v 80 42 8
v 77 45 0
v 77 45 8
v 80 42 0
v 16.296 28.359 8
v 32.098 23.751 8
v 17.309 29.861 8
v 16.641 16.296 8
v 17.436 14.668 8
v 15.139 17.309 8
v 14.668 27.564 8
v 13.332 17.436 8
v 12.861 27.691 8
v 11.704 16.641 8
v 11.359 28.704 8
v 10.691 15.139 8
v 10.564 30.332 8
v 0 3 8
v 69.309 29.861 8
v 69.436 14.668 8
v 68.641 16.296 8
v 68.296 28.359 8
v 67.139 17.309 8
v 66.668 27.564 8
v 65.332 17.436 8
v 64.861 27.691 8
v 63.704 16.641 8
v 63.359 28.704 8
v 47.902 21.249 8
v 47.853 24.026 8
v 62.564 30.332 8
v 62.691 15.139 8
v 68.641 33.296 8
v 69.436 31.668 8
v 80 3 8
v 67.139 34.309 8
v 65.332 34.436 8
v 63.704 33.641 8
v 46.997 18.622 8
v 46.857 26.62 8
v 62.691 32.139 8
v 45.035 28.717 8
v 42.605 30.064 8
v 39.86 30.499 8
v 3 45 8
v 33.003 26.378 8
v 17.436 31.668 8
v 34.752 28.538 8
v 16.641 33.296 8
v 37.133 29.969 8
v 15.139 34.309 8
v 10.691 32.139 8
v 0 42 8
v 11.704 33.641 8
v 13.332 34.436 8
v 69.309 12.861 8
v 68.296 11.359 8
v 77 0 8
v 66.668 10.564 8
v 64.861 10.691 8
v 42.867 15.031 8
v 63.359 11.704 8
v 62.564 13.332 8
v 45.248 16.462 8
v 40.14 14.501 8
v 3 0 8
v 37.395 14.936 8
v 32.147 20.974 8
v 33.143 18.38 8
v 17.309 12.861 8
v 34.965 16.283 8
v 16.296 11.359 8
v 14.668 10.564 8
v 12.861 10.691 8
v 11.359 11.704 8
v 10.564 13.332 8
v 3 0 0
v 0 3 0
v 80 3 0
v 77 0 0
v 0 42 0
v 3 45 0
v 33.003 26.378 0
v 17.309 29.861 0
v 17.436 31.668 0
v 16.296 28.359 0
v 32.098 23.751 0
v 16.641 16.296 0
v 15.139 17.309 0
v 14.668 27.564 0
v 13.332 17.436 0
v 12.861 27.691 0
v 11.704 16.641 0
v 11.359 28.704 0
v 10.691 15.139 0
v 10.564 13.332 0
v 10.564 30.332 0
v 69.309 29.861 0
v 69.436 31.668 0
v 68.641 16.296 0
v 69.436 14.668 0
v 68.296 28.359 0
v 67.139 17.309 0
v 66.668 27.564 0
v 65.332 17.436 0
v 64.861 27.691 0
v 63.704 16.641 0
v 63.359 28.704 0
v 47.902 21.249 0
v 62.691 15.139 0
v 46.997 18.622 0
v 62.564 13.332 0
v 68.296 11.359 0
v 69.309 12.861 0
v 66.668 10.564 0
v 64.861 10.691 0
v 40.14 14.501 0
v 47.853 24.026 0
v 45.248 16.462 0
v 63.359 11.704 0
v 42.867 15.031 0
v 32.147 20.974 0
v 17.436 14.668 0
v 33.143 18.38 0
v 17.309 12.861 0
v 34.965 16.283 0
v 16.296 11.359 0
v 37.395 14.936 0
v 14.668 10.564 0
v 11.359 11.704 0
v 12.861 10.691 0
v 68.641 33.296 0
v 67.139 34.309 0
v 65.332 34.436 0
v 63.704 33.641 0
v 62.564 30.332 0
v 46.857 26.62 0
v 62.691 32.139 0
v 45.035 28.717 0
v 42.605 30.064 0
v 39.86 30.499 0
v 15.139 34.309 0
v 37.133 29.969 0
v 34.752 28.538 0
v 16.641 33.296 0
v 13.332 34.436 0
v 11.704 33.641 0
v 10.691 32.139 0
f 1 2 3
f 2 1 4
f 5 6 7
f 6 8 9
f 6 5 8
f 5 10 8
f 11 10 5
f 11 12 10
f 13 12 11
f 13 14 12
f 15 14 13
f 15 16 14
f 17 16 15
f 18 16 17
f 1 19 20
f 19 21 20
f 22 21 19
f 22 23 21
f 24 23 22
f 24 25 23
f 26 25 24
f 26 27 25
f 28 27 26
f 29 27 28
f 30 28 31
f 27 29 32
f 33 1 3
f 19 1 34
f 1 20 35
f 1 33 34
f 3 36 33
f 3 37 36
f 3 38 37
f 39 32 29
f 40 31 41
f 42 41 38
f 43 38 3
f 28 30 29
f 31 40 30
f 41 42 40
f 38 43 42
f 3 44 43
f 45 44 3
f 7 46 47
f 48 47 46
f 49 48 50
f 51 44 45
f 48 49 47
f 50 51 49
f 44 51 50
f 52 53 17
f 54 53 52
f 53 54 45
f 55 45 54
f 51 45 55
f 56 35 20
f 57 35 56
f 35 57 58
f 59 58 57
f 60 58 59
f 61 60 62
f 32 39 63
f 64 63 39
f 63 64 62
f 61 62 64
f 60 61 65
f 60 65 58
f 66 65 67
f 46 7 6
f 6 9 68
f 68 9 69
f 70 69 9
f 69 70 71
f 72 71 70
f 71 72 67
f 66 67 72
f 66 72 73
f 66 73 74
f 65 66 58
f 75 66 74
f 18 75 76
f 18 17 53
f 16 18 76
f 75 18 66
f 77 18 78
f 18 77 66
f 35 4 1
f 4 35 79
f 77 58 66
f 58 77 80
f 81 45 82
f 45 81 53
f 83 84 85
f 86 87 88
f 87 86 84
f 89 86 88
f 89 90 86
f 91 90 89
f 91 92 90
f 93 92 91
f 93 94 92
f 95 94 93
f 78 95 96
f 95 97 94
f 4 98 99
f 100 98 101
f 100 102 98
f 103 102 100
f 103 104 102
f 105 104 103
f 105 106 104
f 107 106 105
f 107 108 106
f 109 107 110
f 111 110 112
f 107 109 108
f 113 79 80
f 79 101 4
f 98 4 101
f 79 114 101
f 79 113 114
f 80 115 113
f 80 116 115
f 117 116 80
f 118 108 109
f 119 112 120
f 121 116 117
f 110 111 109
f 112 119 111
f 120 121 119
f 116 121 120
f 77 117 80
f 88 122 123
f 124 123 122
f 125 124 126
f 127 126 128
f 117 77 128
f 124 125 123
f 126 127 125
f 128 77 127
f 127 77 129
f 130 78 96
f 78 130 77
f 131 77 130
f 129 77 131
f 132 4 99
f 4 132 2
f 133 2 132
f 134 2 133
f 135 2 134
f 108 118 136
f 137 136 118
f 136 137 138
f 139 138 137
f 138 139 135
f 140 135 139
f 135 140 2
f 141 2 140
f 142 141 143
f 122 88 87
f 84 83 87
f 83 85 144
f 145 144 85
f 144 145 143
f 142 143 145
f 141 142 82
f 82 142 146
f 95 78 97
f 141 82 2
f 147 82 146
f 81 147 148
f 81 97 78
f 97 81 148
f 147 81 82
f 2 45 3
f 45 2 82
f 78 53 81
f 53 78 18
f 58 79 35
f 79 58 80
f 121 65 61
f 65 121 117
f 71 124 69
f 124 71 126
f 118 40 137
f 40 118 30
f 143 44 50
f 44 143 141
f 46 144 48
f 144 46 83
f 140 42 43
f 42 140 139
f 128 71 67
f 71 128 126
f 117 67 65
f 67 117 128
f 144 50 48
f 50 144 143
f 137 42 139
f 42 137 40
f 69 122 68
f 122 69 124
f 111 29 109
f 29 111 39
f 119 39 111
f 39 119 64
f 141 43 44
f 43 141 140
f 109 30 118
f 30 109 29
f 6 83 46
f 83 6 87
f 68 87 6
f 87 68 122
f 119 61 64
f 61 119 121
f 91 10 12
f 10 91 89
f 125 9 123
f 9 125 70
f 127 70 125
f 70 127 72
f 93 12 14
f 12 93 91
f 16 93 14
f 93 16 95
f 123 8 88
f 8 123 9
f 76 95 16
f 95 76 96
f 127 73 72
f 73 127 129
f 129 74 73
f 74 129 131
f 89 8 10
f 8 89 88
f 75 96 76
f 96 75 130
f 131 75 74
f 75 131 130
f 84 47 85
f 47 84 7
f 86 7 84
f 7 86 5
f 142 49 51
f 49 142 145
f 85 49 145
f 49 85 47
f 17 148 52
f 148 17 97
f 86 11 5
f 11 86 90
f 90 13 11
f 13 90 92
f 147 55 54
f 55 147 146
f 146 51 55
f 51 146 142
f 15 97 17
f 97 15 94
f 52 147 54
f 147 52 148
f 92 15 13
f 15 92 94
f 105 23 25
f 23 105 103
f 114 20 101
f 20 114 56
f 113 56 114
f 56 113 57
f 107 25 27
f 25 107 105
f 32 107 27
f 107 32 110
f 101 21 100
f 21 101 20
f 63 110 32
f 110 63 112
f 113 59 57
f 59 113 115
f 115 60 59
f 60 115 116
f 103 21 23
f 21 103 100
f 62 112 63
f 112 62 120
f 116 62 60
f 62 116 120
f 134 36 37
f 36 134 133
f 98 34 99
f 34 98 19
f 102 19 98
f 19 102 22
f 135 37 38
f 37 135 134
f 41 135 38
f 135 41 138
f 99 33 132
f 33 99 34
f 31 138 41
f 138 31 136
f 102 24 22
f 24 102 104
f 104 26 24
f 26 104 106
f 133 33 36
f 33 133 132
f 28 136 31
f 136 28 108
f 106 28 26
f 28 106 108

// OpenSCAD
$fn = 32;

// ----------------------------------------------------------------------
// Spacer plate: rect 80 x 45
// ----------------------------------------------------------------------

// --- parameters (mm) ---
bore_r = 8;               // centre bore radius
bolt_r = 3.5;             // bolt hole radius
plate_t = 8;              // plate thickness, Z (extrusion height)
plate_l = 80;             // plate length, X
plate_w = 45;             // plate width, Y
inset = 14;               // corner hole inset

profile = [[3, 0], [77, 0], [80, 3], [80, 42], [77, 45], [3, 45], [0, 42], [0, 3]];  // primary outline, 8 points, counter clockwise
void_1 = [[47.853, 24.026], [46.857, 26.62], [45.035, 28.717], [42.605, 30.064], [39.86, 30.499], [37.133, 29.969], [34.752, 28.538], [33.003, 26.378], [32.098, 23.751], [32.147, 20.974], [33.143, 18.38], [34.965, 16.283], [37.395, 14.936], [40.14, 14.501], [42.867, 15.031], [45.248, 16.462], [46.997, 18.622], [47.902, 21.249]];  // centre bore, 18 points
void_2 = [[17.436, 14.668], [16.641, 16.296], [15.139, 17.309], [13.332, 17.436], [11.704, 16.641], [10.691, 15.139], [10.564, 13.332], [11.359, 11.704], [12.861, 10.691], [14.668, 10.564], [16.296, 11.359], [17.309, 12.861]];  // corner hole, 12 points
void_3 = [[17.436, 31.668], [16.641, 33.296], [15.139, 34.309], [13.332, 34.436], [11.704, 33.641], [10.691, 32.139], [10.564, 30.332], [11.359, 28.704], [12.861, 27.691], [14.668, 27.564], [16.296, 28.359], [17.309, 29.861]];  // corner hole, 12 points
void_4 = [[69.436, 14.668], [68.641, 16.296], [67.139, 17.309], [65.332, 17.436], [63.704, 16.641], [62.691, 15.139], [62.564, 13.332], [63.359, 11.704], [64.861, 10.691], [66.668, 10.564], [68.296, 11.359], [69.309, 12.861]];  // corner hole, 12 points
void_5 = [[69.436, 31.668], [68.641, 33.296], [67.139, 34.309], [65.332, 34.436], [63.704, 33.641], [62.691, 32.139], [62.564, 30.332], [63.359, 28.704], [64.861, 27.691], [66.668, 27.564], [68.296, 28.359], [69.309, 29.861]];  // corner hole, 12 points

// --- the one profile operation ---
difference() {
  linear_extrude(height = plate_t) polygon(points = profile);
  translate([0, 0, -1])
    linear_extrude(height = plate_t + 2) polygon(points = void_1);
  translate([0, 0, -1])
    linear_extrude(height = plate_t + 2) polygon(points = void_2);
  translate([0, 0, -1])
    linear_extrude(height = plate_t + 2) polygon(points = void_3);
  translate([0, 0, -1])
    linear_extrude(height = plate_t + 2) polygon(points = void_4);
  translate([0, 0, -1])
    linear_extrude(height = plate_t + 2) polygon(points = void_5);
}
